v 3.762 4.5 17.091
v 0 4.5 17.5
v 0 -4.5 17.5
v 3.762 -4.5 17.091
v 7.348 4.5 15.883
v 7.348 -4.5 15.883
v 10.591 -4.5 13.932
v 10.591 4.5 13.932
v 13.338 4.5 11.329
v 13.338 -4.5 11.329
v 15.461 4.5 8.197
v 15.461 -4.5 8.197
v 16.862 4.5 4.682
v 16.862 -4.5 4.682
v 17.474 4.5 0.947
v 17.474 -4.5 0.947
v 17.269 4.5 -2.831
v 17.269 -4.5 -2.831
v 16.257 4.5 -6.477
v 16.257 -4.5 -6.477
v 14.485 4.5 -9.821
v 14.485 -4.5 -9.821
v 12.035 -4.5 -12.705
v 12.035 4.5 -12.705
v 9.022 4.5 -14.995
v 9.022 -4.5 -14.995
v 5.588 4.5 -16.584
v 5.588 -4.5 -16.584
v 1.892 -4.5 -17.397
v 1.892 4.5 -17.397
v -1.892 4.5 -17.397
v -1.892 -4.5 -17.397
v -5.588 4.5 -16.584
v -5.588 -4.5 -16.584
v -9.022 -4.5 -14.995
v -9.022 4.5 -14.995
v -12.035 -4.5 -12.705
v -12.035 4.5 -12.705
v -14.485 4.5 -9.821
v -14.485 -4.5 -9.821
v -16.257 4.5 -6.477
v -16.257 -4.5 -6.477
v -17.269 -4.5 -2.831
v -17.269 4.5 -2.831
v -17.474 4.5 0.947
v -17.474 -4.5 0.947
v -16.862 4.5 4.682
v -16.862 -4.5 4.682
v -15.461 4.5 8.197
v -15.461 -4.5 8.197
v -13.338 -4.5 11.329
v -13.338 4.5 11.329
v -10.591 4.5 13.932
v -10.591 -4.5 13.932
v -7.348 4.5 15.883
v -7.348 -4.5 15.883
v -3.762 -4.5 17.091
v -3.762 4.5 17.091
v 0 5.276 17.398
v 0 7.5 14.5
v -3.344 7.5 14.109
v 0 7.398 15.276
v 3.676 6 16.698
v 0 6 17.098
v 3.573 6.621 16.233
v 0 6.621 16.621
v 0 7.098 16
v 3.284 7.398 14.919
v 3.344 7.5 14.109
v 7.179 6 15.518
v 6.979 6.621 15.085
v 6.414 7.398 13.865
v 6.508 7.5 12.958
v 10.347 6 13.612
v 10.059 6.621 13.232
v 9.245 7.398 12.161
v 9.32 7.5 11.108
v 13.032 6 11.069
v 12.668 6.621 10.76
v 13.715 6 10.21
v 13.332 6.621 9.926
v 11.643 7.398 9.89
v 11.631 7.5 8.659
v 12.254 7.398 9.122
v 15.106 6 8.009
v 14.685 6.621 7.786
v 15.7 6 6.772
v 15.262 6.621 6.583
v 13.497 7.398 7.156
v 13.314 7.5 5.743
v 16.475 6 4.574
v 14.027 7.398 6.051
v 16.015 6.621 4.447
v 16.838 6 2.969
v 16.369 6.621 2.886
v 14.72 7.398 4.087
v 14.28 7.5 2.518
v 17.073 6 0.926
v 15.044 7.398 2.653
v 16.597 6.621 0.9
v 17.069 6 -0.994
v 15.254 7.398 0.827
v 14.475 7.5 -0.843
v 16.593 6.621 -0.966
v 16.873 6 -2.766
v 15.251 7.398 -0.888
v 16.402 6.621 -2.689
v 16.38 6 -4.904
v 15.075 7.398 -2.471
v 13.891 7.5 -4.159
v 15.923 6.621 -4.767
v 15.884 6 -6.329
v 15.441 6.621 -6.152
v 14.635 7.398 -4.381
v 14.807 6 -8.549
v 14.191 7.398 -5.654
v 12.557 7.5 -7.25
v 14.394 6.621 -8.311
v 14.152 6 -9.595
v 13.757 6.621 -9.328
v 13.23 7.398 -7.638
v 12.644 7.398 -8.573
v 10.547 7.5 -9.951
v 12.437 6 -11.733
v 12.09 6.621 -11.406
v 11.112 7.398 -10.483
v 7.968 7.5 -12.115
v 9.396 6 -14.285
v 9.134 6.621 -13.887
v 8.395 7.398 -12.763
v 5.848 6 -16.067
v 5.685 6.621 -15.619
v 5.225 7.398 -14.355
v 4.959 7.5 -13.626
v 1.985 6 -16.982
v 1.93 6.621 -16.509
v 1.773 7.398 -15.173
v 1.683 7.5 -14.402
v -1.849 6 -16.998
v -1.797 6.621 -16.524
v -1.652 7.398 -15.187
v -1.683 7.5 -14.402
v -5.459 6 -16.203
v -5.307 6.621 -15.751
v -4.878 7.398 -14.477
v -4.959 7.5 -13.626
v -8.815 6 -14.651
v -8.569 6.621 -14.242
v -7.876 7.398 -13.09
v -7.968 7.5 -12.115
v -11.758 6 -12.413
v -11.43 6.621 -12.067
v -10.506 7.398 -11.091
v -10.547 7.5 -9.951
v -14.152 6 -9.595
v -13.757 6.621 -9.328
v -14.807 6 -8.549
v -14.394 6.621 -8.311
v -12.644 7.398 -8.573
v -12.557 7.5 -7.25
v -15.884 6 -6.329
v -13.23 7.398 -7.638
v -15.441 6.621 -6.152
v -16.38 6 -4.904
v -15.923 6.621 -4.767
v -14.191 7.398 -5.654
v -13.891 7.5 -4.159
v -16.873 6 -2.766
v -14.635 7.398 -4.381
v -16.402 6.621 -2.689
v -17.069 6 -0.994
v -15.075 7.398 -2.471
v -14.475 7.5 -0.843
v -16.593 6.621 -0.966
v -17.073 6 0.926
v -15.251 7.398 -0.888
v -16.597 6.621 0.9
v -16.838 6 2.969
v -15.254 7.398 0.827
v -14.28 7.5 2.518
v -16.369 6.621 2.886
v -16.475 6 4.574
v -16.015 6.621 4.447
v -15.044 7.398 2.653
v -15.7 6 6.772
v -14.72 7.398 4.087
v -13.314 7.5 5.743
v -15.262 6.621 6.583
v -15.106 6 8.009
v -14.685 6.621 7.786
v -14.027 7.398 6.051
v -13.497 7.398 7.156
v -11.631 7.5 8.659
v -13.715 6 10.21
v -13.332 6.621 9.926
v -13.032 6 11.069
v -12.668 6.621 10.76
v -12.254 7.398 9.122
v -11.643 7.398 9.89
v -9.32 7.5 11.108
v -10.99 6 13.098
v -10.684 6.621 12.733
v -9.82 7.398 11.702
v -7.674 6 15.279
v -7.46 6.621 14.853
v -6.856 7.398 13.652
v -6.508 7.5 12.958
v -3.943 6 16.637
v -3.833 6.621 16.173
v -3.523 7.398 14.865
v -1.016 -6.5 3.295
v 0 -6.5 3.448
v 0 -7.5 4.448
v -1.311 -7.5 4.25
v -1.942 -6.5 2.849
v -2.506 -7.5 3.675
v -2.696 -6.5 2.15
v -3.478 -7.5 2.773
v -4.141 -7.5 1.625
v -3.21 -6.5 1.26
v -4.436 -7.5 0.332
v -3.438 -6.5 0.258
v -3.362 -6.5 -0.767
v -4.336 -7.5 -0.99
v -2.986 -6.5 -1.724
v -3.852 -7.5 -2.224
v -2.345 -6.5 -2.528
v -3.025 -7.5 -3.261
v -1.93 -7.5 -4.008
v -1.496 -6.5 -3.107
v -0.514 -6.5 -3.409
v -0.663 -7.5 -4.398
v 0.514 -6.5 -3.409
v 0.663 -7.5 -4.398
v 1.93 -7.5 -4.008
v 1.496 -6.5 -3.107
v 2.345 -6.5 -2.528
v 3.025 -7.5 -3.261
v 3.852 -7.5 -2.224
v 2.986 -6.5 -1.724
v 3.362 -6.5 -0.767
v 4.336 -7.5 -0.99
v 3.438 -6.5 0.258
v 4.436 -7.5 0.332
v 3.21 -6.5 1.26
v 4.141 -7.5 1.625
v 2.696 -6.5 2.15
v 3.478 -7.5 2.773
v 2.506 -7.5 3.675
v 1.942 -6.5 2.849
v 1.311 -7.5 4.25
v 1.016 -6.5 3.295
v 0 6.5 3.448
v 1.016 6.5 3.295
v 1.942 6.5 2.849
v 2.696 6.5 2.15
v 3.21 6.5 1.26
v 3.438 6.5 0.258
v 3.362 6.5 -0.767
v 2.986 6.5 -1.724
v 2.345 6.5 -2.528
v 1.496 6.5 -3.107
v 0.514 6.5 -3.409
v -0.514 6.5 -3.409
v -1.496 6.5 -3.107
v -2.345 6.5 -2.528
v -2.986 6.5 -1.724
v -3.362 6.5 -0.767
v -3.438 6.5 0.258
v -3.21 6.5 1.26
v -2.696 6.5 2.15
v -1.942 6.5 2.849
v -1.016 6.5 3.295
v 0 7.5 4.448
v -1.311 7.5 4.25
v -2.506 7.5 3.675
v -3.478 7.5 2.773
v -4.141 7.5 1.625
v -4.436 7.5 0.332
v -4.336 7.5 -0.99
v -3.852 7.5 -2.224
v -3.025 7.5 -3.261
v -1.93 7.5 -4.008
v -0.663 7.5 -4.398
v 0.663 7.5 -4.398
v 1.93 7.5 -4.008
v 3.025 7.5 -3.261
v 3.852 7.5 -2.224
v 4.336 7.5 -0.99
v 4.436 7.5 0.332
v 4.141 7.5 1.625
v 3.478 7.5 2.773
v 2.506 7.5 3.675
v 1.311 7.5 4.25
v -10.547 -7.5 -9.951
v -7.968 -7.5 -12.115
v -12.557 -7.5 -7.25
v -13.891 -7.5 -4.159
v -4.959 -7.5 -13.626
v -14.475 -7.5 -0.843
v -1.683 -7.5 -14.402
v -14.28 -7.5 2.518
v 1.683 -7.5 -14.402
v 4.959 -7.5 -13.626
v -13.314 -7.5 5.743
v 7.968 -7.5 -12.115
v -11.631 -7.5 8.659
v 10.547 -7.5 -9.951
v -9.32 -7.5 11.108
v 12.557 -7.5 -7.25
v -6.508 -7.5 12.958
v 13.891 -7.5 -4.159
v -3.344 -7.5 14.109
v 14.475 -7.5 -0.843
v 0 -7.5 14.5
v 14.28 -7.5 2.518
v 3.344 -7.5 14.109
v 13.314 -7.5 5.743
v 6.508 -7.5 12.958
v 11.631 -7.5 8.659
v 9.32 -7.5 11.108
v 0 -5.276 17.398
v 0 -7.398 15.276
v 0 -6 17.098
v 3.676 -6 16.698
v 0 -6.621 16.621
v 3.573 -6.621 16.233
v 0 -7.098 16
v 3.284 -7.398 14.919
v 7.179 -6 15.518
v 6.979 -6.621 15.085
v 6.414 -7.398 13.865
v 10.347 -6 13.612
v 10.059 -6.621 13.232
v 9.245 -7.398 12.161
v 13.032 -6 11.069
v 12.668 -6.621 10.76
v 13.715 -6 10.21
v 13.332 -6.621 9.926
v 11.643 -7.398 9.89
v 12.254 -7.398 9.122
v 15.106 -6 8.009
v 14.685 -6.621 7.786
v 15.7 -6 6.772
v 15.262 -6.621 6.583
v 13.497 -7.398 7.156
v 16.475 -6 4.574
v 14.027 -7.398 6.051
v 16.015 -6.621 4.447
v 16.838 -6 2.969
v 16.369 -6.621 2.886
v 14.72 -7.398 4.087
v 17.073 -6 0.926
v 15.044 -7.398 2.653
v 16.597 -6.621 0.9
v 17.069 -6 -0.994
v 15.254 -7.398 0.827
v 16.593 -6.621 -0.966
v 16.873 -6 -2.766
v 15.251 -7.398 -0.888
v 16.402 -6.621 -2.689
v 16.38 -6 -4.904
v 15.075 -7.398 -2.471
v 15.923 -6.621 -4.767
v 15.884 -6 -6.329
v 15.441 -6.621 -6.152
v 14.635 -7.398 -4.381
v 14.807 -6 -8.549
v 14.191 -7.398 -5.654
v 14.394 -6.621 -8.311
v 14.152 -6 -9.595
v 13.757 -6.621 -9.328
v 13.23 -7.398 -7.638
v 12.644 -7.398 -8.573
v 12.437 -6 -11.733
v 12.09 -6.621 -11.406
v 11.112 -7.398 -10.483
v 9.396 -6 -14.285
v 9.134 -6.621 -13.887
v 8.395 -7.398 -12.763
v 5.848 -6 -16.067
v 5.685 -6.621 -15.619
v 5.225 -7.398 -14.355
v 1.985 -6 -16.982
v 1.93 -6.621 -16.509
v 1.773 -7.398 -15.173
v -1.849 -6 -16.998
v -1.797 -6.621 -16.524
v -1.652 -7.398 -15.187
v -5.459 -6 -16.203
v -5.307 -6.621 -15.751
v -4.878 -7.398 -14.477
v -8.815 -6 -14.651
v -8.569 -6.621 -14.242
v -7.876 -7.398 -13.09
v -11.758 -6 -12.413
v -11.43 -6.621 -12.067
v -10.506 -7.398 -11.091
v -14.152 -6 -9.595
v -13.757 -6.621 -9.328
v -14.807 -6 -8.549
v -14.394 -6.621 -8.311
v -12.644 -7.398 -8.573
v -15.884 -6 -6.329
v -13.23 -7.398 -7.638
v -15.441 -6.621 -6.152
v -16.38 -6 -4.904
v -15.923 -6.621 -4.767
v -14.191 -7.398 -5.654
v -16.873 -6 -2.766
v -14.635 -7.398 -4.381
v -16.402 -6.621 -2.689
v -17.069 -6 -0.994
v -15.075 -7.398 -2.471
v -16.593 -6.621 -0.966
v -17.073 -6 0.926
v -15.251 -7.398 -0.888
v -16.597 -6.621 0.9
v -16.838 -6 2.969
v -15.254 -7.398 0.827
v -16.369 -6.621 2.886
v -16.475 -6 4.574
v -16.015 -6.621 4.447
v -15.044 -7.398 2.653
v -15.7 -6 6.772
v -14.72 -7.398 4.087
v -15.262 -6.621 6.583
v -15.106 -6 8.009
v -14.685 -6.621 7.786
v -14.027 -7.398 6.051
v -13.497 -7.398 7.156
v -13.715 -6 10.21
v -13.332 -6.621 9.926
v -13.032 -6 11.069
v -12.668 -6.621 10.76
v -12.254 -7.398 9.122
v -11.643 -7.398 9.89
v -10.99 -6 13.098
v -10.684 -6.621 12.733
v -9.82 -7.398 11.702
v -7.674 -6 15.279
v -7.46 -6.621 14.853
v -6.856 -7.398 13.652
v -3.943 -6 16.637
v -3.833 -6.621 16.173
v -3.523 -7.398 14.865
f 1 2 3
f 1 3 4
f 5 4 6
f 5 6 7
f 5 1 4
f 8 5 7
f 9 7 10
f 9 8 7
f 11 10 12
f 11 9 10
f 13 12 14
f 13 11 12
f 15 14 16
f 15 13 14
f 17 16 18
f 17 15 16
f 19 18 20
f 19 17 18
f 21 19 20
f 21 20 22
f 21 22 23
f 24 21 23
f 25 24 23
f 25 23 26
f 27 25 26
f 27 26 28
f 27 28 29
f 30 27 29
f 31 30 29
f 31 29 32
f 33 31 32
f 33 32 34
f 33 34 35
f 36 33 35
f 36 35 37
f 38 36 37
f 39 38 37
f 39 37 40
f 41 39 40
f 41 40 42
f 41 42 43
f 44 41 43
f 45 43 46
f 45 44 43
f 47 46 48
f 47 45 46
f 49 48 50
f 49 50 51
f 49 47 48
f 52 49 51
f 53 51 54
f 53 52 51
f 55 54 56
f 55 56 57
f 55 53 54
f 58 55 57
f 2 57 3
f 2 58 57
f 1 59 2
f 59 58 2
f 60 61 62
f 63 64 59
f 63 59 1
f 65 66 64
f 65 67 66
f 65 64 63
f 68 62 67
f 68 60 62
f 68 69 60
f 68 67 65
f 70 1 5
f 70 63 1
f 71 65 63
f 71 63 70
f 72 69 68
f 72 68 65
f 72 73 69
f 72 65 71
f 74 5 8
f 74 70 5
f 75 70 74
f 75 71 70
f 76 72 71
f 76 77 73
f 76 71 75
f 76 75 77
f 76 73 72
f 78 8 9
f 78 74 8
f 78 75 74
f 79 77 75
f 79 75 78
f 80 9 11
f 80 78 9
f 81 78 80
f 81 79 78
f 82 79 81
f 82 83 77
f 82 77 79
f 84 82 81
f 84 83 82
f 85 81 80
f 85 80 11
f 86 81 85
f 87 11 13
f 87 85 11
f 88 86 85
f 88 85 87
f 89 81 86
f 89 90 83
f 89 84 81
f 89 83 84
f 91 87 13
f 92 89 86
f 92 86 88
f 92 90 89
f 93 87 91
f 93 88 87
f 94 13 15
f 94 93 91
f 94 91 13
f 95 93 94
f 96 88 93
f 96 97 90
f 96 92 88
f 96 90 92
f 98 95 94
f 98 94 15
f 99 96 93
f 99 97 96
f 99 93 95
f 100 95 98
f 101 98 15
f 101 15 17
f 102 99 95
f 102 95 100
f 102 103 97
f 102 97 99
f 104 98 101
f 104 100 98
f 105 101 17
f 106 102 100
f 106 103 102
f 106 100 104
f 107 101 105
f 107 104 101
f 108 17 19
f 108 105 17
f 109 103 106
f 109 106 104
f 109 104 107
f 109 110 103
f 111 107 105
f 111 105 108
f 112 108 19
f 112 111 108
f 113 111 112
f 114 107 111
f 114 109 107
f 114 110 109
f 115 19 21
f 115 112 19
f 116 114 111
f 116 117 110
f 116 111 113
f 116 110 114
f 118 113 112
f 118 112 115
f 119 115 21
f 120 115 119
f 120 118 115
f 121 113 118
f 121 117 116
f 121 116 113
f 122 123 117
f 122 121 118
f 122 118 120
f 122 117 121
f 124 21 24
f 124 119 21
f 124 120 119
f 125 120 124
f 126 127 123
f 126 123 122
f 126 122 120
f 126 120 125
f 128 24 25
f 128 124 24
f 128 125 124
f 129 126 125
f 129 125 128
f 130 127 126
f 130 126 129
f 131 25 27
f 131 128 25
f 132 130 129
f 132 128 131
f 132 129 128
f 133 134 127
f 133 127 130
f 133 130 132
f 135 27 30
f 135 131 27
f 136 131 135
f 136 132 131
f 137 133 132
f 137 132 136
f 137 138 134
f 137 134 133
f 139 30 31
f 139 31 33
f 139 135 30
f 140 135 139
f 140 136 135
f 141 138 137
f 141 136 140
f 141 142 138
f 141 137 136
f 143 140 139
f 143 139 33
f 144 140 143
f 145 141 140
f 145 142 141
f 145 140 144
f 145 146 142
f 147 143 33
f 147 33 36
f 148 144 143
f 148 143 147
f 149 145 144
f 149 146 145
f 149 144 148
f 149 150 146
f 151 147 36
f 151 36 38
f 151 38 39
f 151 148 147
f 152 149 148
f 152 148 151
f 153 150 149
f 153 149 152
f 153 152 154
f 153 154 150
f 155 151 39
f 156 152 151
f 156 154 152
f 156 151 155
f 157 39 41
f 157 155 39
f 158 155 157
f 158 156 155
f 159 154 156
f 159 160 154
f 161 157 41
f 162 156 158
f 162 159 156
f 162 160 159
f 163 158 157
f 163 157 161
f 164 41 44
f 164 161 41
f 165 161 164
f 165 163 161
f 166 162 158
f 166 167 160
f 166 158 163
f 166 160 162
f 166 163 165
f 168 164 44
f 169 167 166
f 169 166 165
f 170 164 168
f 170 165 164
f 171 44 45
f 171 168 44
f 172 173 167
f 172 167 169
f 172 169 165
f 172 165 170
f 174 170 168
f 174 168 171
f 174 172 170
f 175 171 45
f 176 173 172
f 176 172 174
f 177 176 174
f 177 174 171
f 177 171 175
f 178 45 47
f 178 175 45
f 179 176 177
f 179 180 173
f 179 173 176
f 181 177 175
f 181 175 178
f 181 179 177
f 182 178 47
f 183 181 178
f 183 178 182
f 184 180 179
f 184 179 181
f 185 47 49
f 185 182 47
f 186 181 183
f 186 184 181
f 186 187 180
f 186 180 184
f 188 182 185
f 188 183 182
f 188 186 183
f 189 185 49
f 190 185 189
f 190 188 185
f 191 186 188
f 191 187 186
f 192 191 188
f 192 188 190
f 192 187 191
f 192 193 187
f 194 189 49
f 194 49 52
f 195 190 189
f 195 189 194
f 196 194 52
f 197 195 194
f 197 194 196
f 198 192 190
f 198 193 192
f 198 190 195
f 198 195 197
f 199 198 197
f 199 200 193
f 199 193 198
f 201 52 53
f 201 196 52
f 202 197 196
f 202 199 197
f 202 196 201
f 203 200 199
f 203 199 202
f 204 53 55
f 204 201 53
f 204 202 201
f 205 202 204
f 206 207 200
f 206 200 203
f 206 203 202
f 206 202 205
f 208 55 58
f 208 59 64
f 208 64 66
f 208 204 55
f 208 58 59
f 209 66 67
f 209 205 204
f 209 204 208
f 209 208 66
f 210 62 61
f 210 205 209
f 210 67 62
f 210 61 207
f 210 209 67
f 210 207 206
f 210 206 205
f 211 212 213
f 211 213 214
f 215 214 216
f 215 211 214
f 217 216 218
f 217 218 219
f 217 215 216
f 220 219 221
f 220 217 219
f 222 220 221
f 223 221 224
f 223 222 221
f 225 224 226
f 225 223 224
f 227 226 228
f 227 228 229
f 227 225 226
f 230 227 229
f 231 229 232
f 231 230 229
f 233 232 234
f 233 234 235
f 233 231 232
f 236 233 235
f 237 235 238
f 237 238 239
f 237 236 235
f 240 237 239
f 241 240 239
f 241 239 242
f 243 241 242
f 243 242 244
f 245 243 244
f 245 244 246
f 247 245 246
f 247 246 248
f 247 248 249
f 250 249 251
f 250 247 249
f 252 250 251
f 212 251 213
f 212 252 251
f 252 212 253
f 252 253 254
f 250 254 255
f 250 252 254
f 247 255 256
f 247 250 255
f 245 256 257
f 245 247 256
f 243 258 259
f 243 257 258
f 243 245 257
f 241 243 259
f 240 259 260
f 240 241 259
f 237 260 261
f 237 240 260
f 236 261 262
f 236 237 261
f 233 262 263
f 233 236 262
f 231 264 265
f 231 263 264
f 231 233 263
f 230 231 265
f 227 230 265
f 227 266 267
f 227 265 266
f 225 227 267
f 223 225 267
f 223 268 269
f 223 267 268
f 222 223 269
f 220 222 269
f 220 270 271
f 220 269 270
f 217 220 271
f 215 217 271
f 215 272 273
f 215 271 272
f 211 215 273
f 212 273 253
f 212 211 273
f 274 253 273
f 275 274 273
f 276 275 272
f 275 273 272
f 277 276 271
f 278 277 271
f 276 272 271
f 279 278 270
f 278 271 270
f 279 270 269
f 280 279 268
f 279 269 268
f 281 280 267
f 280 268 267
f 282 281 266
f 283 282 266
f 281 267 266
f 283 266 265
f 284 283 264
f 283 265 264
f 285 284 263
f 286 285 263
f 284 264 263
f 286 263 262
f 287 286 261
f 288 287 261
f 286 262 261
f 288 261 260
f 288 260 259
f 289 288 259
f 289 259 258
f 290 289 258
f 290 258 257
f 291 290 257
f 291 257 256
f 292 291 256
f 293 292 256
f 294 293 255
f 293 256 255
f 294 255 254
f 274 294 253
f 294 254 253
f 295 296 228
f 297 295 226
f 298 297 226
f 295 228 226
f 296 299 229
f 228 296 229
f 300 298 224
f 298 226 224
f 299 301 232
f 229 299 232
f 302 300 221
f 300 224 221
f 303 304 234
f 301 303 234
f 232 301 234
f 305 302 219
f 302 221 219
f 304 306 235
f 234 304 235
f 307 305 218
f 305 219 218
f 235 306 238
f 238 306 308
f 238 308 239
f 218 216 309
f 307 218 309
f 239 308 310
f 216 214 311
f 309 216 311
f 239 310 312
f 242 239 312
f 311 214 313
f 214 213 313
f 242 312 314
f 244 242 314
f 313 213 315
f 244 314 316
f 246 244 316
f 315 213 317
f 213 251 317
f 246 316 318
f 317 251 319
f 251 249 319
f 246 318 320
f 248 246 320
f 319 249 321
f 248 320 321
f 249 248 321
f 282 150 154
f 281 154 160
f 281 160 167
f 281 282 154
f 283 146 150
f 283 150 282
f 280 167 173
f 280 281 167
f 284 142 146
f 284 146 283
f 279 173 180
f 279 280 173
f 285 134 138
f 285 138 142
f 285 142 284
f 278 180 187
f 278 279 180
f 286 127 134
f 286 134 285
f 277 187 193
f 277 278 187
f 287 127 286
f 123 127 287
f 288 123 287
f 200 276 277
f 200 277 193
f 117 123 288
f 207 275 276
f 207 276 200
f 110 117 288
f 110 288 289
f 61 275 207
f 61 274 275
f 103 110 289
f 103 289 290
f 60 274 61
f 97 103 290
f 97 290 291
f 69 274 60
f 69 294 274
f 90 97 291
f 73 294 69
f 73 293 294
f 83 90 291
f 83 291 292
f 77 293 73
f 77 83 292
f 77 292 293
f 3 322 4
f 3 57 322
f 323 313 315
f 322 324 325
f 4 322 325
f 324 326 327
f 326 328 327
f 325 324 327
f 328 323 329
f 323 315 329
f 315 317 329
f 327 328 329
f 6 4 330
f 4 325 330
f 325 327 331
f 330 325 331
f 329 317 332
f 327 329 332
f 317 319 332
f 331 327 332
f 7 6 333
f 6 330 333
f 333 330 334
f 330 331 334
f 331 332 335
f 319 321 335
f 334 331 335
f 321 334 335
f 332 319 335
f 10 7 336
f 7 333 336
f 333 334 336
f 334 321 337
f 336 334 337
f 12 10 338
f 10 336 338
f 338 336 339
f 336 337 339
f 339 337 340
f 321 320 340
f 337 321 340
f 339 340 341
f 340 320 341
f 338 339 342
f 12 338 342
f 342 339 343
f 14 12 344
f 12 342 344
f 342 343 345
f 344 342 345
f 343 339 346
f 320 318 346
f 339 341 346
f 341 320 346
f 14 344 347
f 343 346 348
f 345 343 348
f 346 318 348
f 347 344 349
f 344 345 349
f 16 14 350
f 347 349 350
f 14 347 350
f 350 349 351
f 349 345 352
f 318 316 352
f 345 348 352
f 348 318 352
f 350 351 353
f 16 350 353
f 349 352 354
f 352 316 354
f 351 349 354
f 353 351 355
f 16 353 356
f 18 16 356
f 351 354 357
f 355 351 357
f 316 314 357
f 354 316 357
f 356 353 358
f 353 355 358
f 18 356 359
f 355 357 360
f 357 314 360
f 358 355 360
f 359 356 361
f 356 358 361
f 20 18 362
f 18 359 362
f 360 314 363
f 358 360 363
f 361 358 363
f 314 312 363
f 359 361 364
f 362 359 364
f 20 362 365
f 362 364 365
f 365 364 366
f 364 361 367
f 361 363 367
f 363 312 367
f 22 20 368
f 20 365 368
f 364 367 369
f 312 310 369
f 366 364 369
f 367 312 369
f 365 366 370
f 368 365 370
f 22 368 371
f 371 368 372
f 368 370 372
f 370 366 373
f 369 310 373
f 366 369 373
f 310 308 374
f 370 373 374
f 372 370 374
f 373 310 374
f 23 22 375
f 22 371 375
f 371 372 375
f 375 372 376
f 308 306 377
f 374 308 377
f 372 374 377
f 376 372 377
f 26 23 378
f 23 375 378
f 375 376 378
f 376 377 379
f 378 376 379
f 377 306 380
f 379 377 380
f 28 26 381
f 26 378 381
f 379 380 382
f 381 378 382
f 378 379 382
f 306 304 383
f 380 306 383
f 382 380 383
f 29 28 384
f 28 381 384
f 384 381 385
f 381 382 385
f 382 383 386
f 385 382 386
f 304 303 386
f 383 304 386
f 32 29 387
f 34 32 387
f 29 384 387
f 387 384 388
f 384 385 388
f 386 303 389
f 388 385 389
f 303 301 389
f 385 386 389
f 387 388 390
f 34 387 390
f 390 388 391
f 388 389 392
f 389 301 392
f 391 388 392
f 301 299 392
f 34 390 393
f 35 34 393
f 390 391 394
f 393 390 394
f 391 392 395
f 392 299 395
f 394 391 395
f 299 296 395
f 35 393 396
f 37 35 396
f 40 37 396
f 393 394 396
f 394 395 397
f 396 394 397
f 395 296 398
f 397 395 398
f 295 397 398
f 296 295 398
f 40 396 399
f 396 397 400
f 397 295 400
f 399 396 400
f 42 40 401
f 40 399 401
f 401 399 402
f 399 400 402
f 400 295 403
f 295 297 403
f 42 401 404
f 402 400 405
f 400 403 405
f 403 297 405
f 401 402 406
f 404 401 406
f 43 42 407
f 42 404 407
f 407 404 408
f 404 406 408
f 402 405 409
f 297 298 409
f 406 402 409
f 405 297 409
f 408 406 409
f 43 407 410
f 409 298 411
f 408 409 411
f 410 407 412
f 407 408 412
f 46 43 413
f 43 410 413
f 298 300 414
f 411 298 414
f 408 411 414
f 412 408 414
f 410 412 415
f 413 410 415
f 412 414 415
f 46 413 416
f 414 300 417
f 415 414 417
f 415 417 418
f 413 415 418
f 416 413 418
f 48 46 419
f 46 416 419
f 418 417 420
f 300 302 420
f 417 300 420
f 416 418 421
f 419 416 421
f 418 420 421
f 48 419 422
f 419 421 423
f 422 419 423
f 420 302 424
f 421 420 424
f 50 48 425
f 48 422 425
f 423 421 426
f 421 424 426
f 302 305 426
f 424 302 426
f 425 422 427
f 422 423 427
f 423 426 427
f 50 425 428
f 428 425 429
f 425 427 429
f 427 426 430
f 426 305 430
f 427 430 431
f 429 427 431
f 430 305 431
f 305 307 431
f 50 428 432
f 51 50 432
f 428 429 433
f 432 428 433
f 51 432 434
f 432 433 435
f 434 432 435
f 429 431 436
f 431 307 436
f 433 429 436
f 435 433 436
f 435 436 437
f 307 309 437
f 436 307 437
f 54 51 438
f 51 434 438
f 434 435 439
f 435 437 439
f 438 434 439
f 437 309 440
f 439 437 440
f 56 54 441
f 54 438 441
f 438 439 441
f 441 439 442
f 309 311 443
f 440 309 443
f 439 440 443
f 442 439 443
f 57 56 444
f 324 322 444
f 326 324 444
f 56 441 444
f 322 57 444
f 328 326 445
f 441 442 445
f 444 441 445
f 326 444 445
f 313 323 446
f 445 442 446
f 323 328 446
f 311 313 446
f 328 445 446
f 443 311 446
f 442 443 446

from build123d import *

# Parameters (mm, degrees)
SKETCH2_R               = 17.5
BOSS_EXTRUDE1_DEPTH     = 7.5
FILLET1_R               = 3
CUT_EXTRUDE1_DEPTH      = 26.860201082
CUT_EXTRUDE1_DEPTH_BACK = 26.860201082
SKETCH4_R               = 3.448
CHAMFER1_SIZE           = 1


with BuildPart() as part:
    # Sketch2 → Boss-Extrude1 (new, symmetric)
    with BuildSketch(Plane(origin=(0, 0, 0), x_dir=(1, 0, 0), z_dir=(0, 1, 0))):
        Circle(SKETCH2_R)
    extrude(amount=BOSS_EXTRUDE1_DEPTH, both=True)

    # Fillet1
    fillet1_edges = [part.edges().sort_by_distance(p)[0] for p in [
        (-17.5, -7.5, 0),
        (-17.5, 7.5, 0),
    ]]
    fillet(fillet1_edges, radius=FILLET1_R)

    # Sketch4 → Cut-Extrude1 (cut, two sides: drawn at the far end of the back side and taken through both)
    with BuildSketch(Plane(origin=(0, 0, 0), x_dir=(1, 0, 0), z_dir=(0, 1, 0)).offset(-CUT_EXTRUDE1_DEPTH_BACK)):
        Circle(SKETCH4_R)
    extrude(amount=CUT_EXTRUDE1_DEPTH + CUT_EXTRUDE1_DEPTH_BACK, mode=Mode.SUBTRACT)

    # Chamfer1
    chamfer1_edges = [part.edges().sort_by_distance(p)[0] for p in [
        (-3.448, 7.5, 0),
        (-3.448, -7.5, 0),
    ]]
    chamfer(chamfer1_edges, length=CHAMFER1_SIZE)


solid = part.part
